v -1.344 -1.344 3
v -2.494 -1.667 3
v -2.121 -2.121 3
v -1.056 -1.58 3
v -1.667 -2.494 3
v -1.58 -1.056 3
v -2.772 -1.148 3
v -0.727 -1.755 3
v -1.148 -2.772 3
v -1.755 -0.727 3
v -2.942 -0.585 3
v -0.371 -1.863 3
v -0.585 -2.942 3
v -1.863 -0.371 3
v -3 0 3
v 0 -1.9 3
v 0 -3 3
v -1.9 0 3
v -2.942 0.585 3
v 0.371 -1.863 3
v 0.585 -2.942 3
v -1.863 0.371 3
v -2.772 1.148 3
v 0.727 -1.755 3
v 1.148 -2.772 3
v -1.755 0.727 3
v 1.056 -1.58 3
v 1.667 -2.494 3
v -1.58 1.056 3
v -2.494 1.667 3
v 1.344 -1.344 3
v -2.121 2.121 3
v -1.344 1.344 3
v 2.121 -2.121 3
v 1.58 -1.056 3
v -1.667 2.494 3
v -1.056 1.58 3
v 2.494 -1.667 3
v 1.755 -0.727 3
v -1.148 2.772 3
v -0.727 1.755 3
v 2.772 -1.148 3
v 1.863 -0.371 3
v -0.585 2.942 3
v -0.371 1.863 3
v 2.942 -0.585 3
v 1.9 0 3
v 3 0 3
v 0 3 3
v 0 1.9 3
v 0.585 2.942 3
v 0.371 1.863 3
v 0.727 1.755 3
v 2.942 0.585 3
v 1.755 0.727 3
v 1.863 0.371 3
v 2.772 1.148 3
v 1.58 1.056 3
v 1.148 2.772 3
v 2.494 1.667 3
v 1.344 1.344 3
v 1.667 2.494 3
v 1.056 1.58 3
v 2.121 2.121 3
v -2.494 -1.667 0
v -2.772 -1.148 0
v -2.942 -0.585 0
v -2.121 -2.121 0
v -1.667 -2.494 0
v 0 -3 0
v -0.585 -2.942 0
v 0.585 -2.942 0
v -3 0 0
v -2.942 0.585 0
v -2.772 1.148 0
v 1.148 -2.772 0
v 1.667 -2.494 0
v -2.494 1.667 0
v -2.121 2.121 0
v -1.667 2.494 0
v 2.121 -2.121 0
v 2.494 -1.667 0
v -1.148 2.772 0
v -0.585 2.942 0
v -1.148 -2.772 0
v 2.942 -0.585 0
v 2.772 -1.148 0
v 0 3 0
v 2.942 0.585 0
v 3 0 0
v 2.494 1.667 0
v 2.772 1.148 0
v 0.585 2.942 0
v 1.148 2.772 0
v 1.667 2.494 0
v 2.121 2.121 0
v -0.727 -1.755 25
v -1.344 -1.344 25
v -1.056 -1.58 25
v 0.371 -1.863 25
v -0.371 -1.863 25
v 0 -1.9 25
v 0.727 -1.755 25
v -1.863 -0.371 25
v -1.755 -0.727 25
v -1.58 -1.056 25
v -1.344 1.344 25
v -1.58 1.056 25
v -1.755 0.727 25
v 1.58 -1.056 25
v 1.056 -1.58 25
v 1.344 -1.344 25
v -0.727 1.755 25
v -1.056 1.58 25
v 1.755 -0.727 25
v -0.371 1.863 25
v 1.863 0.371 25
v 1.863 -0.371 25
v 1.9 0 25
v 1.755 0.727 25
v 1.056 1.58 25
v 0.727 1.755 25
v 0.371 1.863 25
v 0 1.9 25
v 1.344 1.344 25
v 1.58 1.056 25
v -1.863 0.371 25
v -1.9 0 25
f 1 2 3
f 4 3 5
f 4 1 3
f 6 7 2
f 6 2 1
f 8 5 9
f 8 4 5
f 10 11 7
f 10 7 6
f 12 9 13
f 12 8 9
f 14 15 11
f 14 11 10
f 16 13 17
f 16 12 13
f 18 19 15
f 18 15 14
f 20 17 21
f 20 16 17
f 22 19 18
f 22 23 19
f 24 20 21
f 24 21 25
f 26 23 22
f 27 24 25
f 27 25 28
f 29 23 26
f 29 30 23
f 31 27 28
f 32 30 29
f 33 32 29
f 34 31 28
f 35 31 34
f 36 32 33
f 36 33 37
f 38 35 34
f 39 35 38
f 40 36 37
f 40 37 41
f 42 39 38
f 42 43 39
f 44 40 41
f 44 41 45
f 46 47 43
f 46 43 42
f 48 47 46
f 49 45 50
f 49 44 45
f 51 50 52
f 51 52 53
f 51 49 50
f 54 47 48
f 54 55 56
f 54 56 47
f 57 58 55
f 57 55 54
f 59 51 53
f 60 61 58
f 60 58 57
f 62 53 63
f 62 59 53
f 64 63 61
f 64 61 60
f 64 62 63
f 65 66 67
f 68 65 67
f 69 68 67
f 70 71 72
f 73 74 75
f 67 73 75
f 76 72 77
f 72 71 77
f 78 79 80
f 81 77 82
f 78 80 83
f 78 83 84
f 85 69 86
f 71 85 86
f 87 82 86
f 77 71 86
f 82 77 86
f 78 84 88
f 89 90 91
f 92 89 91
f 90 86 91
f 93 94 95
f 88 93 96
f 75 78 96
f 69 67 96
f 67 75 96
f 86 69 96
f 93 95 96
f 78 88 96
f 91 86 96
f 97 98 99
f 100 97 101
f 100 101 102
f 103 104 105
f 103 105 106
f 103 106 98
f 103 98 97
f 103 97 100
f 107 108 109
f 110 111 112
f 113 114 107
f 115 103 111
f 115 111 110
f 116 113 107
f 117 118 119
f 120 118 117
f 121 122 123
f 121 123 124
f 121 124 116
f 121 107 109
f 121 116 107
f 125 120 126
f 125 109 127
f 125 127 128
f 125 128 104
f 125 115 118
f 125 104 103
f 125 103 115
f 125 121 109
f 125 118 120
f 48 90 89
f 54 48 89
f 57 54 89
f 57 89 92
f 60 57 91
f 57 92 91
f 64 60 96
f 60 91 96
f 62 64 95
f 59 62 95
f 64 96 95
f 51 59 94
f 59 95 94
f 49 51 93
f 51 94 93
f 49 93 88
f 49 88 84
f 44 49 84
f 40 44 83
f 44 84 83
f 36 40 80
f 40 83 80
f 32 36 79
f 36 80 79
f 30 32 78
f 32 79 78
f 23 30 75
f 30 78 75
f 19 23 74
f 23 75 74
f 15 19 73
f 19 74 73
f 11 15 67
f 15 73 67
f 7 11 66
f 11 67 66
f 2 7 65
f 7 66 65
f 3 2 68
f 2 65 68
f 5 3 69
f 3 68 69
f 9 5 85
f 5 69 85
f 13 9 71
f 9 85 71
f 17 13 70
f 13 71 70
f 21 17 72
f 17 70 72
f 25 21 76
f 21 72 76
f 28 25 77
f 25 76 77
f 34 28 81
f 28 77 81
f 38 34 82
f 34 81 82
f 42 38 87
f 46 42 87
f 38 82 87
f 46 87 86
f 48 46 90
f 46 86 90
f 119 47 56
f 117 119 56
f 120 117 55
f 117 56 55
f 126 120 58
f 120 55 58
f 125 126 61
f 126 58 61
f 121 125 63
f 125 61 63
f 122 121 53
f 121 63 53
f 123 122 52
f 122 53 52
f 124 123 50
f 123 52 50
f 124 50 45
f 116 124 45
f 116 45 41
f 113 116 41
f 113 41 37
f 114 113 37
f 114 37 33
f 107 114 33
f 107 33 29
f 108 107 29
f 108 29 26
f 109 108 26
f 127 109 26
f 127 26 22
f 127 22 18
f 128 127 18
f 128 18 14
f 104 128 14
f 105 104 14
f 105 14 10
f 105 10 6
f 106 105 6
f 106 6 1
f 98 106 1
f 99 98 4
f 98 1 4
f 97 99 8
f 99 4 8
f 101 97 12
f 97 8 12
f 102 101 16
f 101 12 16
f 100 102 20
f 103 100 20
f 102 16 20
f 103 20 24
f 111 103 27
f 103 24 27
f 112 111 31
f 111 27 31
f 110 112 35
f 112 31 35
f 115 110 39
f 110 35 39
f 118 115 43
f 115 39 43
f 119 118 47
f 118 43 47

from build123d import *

# Parameters (mm, degrees)
CYLINDER001_R     = 3
CYLINDER001_DEPTH = 3
CYLINDER_R        = 1.9
CYLINDER_DEPTH    = 25


with BuildPart() as bolt_head:
    # Cylinder001 → Cylinder001 (new body)
    with BuildSketch(Plane.XY):
        Circle(CYLINDER001_R)
    extrude(amount=CYLINDER001_DEPTH)


with BuildPart() as m3_bolt:
    # Cylinder → Cylinder (new body)
    with BuildSketch(Plane.XY):
        Circle(CYLINDER_R)
    extrude(amount=CYLINDER_DEPTH)

    # Fusion: union Bolt_Head
    add(bolt_head.part)


solid = m3_bolt.part
